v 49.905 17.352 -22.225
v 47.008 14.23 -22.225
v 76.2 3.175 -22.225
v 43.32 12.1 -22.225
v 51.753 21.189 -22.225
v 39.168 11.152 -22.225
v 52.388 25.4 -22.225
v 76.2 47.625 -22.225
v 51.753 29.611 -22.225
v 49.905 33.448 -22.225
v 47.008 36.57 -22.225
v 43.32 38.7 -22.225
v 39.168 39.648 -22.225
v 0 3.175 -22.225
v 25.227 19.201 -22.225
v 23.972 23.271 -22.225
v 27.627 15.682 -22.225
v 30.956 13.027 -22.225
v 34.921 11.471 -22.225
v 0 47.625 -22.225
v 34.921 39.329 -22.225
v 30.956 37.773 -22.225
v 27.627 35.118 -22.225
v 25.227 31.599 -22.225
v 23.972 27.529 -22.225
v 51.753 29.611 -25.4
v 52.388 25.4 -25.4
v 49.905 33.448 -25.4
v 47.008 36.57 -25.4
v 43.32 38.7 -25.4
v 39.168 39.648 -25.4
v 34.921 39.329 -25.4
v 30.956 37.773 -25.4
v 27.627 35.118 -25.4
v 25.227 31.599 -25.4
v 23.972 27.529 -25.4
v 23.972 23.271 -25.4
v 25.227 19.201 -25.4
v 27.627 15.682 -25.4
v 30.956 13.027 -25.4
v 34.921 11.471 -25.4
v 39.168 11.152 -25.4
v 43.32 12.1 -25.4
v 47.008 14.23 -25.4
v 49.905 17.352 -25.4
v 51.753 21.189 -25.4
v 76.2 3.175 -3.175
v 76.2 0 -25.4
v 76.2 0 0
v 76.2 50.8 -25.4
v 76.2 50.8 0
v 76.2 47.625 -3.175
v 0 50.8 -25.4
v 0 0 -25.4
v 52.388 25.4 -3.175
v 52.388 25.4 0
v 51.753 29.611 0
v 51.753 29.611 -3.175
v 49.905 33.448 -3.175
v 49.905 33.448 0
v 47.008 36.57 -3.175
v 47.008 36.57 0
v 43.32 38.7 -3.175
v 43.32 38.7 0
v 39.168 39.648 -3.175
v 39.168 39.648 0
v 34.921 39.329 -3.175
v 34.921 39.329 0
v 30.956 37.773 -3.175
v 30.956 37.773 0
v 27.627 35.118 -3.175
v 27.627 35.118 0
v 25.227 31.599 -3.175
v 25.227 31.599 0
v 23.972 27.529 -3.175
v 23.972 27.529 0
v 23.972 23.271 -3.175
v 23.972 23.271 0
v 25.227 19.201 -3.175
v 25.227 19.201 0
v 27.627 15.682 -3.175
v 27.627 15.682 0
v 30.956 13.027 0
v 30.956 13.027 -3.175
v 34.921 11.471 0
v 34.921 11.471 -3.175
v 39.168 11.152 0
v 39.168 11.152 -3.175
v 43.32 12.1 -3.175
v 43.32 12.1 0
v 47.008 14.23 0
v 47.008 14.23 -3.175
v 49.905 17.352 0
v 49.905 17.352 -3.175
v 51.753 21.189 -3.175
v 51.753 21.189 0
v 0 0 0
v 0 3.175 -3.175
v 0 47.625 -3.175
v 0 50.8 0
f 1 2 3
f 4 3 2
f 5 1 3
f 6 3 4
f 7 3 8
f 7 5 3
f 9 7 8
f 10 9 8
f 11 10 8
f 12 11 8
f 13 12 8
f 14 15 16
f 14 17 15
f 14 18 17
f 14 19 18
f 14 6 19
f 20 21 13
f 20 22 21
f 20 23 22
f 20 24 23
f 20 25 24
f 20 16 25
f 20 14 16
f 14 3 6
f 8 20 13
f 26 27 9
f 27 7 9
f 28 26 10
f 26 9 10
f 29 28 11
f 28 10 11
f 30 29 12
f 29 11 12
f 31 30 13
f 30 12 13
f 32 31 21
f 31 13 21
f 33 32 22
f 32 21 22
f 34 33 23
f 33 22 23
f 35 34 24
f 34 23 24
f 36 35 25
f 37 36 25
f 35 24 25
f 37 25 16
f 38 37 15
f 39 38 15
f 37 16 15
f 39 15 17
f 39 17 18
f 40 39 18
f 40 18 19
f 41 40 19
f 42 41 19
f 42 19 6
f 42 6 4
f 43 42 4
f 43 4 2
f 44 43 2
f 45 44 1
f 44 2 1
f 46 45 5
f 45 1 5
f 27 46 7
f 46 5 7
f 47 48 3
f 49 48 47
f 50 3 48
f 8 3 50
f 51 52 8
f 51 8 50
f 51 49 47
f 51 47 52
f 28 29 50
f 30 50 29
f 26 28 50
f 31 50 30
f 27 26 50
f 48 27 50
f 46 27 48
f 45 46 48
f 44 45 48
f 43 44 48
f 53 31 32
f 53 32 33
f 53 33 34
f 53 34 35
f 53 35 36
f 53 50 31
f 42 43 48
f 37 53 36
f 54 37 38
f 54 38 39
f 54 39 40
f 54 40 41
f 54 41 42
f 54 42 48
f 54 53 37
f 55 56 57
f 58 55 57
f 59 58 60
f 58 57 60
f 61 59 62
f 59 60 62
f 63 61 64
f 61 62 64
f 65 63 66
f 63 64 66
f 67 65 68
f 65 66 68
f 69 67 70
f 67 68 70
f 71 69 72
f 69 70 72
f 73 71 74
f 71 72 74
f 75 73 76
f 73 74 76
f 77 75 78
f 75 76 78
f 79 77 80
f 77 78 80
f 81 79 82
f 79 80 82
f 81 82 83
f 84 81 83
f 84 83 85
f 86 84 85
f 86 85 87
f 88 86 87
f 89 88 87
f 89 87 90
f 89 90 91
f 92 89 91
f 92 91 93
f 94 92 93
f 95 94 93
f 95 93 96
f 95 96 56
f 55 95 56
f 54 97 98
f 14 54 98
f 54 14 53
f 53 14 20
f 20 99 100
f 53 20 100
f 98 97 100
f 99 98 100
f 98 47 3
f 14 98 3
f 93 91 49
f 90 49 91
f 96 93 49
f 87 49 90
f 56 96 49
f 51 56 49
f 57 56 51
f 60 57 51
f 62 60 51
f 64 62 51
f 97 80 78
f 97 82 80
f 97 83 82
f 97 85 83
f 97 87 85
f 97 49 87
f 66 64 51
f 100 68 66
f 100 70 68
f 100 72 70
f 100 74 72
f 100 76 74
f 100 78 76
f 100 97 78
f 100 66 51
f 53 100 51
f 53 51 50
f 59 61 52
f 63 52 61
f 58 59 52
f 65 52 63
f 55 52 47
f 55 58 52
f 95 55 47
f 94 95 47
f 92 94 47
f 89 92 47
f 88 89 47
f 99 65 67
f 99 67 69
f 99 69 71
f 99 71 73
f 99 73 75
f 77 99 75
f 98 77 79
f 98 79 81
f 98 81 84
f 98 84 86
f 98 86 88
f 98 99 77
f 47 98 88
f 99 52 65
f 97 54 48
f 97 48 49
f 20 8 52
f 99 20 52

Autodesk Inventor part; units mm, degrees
ref_plane "YZ Plane" through (0, 0, 0) normal (1, 0, 0) x (0, 1, 0)
ref_plane "XZ Plane" through (0, 0, 0) normal (0, 1, 0) x (-1, 0, 0)
ref_plane "XY Plane" through (0, 0, 0) normal (0, 0, 1) x (1, 0, 0)
sketch "Sketch1" plane through (0, 0, 0) normal (1, 0, 0) x (0, 1, 0)
  line L0 (0, 0) -> (50.8, 0)
  line L1 (50.8, 0) -> (50.8, -25.4)
  line L2 (50.8, -25.4) -> (0, -25.4)
  line L3 (0, -25.4) -> (0, 0)
  line L4 (47.625, -22.225) -> (47.625, -3.175)
  line L5 (47.625, -3.175) -> (3.175, -3.175)
  line L6 (3.175, -3.175) -> (3.175, -22.225)
  line L7 (3.175, -22.225) -> (47.625, -22.225)
  dimension "d0" = 50.8
  dimension "d1" = 25.4
  dimension "d2" = 3.175
extrude "Extrusion1" add sketch "Sketch1" along normal blind 76.2
sketch "Sketch2" plane through (0, 0, 0) normal (0, 0, 1) x (1, 0, 0)
  circle A0 centre (38.1, 25.4) radius 14.2875
  point P0 (0, 0)
  dimension "d5" = 28.575
extrude "Extrusion2" cut sketch "Sketch2" against normal blind 76.2
properties part number "liftaxelbar"
